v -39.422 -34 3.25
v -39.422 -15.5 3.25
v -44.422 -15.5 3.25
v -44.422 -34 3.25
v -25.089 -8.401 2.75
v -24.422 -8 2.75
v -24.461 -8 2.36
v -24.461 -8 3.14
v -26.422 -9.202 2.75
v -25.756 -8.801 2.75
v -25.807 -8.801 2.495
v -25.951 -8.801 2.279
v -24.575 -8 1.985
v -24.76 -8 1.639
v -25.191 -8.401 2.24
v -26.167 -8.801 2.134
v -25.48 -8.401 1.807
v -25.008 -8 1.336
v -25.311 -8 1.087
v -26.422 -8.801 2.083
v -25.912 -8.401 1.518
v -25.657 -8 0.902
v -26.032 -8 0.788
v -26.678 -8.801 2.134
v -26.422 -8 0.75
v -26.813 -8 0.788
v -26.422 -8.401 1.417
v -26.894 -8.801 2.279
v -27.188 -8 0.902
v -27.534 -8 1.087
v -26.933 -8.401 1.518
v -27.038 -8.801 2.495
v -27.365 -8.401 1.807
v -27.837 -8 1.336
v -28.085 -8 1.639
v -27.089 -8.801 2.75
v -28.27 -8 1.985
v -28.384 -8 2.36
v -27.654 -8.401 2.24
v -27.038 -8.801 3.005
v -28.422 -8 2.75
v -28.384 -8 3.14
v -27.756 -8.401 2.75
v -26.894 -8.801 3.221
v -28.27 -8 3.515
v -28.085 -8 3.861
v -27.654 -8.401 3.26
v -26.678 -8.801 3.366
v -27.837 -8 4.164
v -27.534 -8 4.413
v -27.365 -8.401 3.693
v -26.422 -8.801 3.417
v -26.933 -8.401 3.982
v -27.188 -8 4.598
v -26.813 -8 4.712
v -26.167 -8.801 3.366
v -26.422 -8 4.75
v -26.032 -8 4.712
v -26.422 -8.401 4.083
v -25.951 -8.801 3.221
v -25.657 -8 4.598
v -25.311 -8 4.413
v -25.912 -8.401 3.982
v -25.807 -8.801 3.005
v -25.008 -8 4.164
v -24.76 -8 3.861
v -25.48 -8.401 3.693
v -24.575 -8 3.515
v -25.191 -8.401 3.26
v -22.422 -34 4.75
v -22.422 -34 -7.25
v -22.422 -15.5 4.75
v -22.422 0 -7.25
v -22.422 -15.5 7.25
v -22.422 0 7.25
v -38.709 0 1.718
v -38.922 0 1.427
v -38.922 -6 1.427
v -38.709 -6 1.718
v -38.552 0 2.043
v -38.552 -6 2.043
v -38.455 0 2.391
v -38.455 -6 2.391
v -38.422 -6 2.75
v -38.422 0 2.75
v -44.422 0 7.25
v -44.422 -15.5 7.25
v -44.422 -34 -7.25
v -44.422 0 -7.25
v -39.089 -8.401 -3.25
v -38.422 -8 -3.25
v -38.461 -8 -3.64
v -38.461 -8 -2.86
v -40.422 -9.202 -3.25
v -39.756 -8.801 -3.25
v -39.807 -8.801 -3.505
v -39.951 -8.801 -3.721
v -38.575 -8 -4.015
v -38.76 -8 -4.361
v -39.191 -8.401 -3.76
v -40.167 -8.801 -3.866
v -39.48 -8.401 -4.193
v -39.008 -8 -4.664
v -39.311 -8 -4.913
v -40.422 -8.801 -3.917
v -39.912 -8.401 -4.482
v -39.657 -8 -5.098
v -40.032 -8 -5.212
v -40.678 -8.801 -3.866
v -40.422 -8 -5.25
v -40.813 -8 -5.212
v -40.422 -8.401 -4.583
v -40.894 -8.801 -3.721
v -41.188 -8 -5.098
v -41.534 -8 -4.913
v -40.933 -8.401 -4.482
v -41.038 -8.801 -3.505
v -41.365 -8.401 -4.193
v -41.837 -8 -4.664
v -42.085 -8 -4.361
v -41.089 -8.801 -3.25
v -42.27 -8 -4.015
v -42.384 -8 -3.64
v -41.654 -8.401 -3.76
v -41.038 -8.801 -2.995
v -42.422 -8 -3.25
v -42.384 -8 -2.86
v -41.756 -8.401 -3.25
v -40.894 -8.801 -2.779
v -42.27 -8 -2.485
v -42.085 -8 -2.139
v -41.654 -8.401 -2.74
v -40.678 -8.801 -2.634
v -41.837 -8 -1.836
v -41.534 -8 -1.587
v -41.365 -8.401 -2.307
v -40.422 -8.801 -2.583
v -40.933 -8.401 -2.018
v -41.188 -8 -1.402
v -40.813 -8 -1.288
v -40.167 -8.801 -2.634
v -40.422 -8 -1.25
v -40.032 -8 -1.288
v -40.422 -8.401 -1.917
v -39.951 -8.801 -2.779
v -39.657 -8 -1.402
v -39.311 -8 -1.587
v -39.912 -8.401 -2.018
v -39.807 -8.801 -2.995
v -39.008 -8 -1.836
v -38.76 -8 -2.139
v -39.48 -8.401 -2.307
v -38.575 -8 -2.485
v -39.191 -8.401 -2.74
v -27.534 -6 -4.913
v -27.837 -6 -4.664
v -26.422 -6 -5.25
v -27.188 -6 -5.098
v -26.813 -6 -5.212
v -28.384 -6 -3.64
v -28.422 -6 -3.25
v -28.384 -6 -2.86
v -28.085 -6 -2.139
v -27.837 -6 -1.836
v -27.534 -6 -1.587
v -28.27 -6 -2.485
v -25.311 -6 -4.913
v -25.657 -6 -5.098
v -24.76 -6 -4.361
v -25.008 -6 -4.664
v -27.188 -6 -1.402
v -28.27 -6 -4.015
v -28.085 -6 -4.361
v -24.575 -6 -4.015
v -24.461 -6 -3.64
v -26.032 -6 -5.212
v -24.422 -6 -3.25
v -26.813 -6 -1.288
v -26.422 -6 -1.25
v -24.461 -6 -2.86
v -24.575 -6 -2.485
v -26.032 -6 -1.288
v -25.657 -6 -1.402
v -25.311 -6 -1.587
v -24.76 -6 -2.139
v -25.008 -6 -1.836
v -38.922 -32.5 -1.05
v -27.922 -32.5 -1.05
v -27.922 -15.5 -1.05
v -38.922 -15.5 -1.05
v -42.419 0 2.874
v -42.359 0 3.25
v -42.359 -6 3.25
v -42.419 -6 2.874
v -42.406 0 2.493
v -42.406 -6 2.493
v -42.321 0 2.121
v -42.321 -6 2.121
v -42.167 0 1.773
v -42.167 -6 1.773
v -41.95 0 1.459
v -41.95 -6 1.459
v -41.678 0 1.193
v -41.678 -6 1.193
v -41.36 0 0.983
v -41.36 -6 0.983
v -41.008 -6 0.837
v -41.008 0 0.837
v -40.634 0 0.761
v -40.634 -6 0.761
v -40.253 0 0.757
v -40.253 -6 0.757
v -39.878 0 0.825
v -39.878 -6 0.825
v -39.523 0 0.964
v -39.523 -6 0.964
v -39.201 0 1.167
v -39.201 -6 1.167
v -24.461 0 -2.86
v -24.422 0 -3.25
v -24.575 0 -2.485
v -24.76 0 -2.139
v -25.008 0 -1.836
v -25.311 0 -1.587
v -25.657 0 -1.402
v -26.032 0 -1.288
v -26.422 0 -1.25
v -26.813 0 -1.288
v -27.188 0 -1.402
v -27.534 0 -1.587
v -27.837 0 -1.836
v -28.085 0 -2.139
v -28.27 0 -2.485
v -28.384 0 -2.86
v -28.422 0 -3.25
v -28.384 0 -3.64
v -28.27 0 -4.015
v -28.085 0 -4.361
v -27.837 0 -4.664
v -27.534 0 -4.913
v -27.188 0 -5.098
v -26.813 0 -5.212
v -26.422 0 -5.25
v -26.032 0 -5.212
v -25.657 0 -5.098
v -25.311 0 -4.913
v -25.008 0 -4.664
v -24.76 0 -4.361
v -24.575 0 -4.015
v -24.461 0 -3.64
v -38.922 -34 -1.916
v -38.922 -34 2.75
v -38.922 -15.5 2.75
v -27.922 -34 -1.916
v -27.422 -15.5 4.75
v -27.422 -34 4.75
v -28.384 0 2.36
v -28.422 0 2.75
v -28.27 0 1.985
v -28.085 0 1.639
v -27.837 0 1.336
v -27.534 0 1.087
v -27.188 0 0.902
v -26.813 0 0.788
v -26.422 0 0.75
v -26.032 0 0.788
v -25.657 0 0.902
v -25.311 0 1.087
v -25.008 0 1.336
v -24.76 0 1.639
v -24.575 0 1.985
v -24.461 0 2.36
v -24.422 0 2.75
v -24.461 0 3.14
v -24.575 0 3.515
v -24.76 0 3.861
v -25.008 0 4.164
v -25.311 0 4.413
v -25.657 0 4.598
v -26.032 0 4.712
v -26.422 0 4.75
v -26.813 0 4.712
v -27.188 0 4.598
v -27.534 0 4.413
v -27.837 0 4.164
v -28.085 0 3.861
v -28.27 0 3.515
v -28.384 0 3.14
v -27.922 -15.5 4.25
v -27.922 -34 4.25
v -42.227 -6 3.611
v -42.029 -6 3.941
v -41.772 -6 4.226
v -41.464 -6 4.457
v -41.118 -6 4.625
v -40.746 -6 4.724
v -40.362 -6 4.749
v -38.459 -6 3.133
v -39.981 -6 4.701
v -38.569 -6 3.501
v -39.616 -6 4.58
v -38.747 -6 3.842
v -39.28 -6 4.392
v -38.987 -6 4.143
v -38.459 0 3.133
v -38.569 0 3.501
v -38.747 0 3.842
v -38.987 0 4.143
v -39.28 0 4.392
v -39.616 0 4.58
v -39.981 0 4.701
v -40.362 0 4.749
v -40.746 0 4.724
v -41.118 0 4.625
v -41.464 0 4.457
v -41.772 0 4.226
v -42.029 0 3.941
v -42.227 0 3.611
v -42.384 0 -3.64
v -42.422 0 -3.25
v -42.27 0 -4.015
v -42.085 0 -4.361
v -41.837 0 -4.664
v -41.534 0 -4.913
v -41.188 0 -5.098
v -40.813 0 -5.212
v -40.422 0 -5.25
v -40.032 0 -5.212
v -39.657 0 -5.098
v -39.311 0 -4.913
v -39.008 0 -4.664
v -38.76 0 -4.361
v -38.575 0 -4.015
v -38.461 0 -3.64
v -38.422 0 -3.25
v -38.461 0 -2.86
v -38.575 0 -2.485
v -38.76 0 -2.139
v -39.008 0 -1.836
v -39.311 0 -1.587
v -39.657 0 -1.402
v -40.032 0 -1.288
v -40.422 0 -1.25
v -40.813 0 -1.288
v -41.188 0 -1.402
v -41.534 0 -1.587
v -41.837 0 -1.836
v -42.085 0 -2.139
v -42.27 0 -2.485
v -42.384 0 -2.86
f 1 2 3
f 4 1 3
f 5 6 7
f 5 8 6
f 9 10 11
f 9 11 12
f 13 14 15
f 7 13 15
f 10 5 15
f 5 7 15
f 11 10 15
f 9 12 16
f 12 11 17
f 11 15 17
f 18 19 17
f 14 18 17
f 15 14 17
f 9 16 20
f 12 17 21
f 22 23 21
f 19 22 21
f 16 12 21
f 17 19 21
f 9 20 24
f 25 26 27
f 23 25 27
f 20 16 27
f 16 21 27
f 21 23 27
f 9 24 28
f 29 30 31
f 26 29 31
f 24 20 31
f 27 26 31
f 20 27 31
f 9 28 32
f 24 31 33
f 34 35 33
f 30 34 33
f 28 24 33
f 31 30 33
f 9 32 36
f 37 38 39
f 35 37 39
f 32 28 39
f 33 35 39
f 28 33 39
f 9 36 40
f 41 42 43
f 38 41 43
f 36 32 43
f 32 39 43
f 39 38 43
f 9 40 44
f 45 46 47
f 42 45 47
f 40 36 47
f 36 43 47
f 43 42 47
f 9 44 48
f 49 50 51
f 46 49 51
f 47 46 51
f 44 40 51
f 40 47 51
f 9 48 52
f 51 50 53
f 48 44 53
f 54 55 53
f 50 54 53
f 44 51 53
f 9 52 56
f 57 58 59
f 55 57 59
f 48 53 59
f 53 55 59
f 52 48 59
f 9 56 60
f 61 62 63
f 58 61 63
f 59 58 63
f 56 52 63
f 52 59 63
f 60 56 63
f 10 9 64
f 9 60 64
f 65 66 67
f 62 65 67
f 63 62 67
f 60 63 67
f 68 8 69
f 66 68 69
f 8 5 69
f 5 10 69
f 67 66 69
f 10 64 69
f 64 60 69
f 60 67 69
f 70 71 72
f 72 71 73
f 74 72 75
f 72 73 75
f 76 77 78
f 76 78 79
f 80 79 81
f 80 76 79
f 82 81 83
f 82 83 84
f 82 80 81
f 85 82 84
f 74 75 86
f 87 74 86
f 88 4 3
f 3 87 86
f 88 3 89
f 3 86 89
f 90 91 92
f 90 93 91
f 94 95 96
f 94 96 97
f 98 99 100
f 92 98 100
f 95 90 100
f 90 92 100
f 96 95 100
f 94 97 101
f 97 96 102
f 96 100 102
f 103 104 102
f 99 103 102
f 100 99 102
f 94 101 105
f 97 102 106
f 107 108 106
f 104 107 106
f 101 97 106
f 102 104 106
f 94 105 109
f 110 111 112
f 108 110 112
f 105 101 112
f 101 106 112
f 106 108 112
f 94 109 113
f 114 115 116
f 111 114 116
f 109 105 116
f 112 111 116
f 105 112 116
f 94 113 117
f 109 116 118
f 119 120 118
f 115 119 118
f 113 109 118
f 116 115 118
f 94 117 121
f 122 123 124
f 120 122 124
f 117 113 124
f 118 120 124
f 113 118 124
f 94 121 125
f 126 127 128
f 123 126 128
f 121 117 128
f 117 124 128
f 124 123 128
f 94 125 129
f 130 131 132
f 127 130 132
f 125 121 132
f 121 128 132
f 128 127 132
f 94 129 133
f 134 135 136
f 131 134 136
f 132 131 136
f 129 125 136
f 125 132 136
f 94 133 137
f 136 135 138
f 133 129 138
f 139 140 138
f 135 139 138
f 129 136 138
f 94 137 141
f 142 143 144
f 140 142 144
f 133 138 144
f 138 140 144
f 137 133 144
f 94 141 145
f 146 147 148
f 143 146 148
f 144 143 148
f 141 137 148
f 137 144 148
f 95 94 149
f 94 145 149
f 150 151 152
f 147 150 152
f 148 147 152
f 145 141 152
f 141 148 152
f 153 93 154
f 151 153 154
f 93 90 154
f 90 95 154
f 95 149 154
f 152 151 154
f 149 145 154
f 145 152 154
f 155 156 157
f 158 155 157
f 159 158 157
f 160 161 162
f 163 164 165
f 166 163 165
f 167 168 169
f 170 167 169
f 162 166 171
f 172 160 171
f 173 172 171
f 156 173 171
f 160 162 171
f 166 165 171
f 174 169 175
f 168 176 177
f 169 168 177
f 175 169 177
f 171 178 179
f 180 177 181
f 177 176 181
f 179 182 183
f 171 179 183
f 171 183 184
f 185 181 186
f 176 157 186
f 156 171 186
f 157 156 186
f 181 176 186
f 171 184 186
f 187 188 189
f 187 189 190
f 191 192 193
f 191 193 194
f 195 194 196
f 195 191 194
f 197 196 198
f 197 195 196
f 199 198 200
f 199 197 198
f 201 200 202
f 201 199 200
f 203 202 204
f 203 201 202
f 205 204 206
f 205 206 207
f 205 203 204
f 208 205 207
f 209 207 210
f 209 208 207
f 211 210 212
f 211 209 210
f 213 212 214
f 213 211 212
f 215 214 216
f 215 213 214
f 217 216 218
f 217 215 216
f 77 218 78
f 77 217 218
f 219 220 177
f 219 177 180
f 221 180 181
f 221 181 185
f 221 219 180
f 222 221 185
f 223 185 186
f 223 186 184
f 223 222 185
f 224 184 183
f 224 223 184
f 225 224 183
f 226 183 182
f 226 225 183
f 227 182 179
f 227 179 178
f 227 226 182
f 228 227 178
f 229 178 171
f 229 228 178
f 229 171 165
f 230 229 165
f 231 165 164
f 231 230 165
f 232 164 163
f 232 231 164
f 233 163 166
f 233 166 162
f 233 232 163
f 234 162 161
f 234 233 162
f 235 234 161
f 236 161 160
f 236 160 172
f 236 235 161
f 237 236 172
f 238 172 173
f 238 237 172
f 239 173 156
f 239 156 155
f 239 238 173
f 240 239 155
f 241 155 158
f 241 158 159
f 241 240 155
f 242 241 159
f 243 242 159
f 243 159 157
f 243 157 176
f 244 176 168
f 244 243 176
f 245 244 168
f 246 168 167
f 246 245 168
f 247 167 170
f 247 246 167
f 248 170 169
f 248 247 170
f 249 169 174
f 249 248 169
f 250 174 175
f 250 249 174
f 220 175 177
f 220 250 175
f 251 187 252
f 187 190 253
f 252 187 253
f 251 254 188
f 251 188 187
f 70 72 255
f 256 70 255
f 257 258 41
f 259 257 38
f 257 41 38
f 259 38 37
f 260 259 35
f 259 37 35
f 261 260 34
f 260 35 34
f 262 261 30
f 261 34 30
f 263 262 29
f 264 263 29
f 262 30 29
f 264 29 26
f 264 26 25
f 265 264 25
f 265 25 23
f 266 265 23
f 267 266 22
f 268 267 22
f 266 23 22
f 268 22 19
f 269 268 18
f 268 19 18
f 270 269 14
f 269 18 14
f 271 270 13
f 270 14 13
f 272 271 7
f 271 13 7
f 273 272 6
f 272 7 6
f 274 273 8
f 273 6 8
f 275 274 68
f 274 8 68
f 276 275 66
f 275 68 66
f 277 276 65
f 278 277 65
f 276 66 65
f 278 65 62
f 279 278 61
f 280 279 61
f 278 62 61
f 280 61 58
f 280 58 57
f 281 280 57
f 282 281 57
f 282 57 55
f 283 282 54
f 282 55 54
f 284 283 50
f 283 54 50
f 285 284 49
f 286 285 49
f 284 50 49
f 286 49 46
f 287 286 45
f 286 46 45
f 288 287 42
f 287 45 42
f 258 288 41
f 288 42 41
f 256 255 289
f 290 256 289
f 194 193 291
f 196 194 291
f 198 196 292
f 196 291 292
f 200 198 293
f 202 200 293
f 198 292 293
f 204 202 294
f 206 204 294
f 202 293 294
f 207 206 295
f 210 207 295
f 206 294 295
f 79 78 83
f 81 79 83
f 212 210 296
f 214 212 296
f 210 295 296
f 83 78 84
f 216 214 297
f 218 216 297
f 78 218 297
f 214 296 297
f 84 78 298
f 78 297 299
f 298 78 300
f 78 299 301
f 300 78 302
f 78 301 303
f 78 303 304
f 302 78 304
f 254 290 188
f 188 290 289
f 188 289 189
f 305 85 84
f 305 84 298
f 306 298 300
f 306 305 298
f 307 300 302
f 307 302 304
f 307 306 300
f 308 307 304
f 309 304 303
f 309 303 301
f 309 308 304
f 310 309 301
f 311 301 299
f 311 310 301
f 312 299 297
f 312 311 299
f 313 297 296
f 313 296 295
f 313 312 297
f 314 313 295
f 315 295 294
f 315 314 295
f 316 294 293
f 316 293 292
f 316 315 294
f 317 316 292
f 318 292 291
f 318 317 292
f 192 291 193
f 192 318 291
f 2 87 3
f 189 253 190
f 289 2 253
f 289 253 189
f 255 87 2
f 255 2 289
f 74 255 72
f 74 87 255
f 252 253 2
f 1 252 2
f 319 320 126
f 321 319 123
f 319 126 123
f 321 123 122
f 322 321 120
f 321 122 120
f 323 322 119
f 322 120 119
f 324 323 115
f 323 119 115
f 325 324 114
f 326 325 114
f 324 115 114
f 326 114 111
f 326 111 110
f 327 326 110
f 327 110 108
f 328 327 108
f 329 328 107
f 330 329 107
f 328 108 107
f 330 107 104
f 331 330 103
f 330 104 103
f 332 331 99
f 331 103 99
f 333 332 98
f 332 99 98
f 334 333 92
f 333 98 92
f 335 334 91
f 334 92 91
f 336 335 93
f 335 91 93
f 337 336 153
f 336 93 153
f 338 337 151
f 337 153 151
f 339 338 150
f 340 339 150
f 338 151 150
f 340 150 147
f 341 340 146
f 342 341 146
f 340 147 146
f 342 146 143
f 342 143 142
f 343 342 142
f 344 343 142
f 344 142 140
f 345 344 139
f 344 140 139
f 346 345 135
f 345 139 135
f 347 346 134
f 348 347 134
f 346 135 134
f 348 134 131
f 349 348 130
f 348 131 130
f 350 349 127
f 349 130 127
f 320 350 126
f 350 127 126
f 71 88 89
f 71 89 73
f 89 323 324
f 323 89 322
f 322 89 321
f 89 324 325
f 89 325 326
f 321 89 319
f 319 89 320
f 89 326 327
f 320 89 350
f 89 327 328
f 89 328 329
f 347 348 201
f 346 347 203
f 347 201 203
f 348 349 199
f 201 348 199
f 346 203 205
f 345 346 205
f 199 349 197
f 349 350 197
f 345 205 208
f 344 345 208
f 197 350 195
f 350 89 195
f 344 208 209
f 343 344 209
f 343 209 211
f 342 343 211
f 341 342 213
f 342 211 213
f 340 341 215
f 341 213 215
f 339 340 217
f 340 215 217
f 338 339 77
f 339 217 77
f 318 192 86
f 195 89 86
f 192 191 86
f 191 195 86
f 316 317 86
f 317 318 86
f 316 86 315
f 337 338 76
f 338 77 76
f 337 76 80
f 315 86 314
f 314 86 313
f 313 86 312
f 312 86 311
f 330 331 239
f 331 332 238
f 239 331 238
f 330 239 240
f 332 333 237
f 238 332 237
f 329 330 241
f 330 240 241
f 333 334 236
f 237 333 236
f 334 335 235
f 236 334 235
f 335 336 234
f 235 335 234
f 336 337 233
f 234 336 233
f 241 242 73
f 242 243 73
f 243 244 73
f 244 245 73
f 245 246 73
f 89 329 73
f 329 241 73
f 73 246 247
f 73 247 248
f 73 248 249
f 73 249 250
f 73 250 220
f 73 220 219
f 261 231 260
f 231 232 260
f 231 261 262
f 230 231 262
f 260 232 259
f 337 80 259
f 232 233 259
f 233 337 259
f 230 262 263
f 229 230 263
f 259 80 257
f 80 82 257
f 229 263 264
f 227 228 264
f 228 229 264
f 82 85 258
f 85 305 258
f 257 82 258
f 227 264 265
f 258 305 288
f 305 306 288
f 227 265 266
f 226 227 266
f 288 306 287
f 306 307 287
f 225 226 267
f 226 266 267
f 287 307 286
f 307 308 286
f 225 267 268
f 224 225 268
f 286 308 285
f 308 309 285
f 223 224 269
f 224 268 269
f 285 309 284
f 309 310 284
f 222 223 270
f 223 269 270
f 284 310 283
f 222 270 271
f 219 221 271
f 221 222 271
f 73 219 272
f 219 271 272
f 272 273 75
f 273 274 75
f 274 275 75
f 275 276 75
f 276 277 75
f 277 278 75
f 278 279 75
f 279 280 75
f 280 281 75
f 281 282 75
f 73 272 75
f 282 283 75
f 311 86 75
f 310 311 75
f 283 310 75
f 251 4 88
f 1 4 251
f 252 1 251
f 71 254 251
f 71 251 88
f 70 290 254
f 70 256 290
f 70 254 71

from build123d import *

# Parameters (mm, degrees)
F0_W     = 11
F0_H     = 1.5
F0_R     = 1.62
F0_R_2   = 2
F1_DEPTH = 15.5
F3_DEPTH = 18.5
F4_D     = 4
F4_DEPTH = 8
F4_TIP   = 1.2017212381
F5_DEPTH = 6
F6_SIZE2 = 0.8660254038
F6_SIZE  = 1.5


with BuildPart() as f1:
    # F0 (on Front) → F1 (new body)
    with BuildSketch(Plane.XZ):
        with Locations((-33.422443, -0.3)):
            Rectangle(F0_W, F0_H)
        with BuildLine():
            ThreePointArc((-42.3589346731, 3.25), (-41.3596463712, 0.9831808692), (-38.922443, 1.4271243445))
            Line((-38.922443, 1.4271243445), (-38.922443, 2.75))
            Line((-38.922443, 2.75), (-39.422443, 3.25))
            Line((-39.422443, 3.25), (-42.3589346731, 3.25))
        make_face()
        with BuildLine():
            Line((-38.922443, 1.4271243445), (-38.922443, 0.45))
            Line((-38.922443, 0.45), (-27.922443, 0.45))
            Line((-27.922443, 0.45), (-27.922443, 1.4271243445))
            Line((-27.922443, 1.4271243445), (-27.922443, 2.1381176584))
            ThreePointArc((-27.922443, 2.1381176584), (-28.042443, 2.75), (-27.922443, 3.3618823416))
            Line((-27.922443, 3.3618823416), (-27.922443, 4.25))
            Line((-27.922443, 4.25), (-27.422443, 4.75))
            Line((-27.422443, 4.75), (-26.4224430007, 4.75))
            Line((-26.4224430007, 4.75), (-22.422443, 4.75))
            Line((-22.422443, 4.75), (-22.422443, 7.25))
            Line((-22.422443, 7.25), (-44.422443, 7.25))
            Line((-44.422443, 7.25), (-44.422443, 3.25))
            Line((-44.422443, 3.25), (-42.3589346731, 3.25))
            ThreePointArc((-42.3589346731, 3.25), (-40.170434415, 4.7340593925), (-38.422443, 2.75))
            ThreePointArc((-38.422443, 2.75), (-38.5516143066, 2.0428932188), (-38.922443, 1.4271243445))
        make_face()
        with BuildLine():
            Line((-38.922443, 2.75), (-38.922443, 1.4271243445))
            ThreePointArc((-38.922443, 1.4271243445), (-38.5516143066, 2.0428932188), (-38.422443, 2.75))
            ThreePointArc((-38.422443, 2.75), (-40.170434415, 4.7340593925), (-42.3589346731, 3.25))
            Line((-42.3589346731, 3.25), (-39.422443, 3.25))
            Line((-39.422443, 3.25), (-38.922443, 2.75))
        make_face()
        with BuildLine():
            Line((-27.922443, 3.3618823416), (-27.922443, 2.1381176584))
            ThreePointArc((-27.922443, 2.1381176584), (-26.1106738546, 1.1602830441), (-24.802443, 2.75))
            ThreePointArc((-24.802443, 2.75), (-26.1106738546, 4.3397169559), (-27.922443, 3.3618823416))
        make_face()
        with BuildLine():
            Line((-27.922443, -1.05), (-38.922443, -1.05))
            Line((-38.922443, -1.05), (-38.922443, 0.45))
            Line((-38.922443, 0.45), (-38.922443, 1.4271243445))
            ThreePointArc((-38.922443, 1.4271243445), (-41.3596463712, 0.9831808692), (-42.3589346731, 3.25))
            Line((-42.3589346731, 3.25), (-44.422443, 3.25))
            Line((-44.422443, 3.25), (-44.422443, -7.25))
            Line((-44.422443, -7.25), (-22.422443, -7.25))
            Line((-22.422443, -7.25), (-22.422443, 4.75))
            Line((-22.422443, 4.75), (-26.4224430007, 4.75))
            ThreePointArc((-26.4224430007, 4.75), (-24.5995673443, 1.9271243448), (-27.922443, 1.4271243445))
            Line((-27.922443, 1.4271243445), (-27.922443, 0.45))
            Line((-27.922443, 0.45), (-27.922443, -1.05))
        make_face()
        with Locations((-40.422443, -3.25)):
            Circle(F0_R, mode=Mode.SUBTRACT)
        with Locations((-26.422443, -3.25)):
            Circle(F0_R_2, mode=Mode.SUBTRACT)
        with Locations((-26.422443, -3.25)):
            Circle(F0_R_2)
        with Locations((-40.422443, -3.25)):
            Circle(F0_R)
        with BuildLine():
            Line((-27.922443, 2.1381176584), (-27.922443, 1.4271243445))
            ThreePointArc((-27.922443, 1.4271243445), (-24.5995673443, 1.9271243448), (-26.4224430007, 4.75))
            Line((-26.4224430007, 4.75), (-27.422443, 4.75))
            Line((-27.422443, 4.75), (-27.922443, 4.25))
            Line((-27.922443, 4.25), (-27.922443, 3.3618823416))
            ThreePointArc((-27.922443, 3.3618823416), (-26.1106738546, 4.3397169559), (-24.802443, 2.75))
            ThreePointArc((-24.802443, 2.75), (-26.1106738546, 1.1602830441), (-27.922443, 2.1381176584))
        make_face()
        with BuildLine():
            ThreePointArc((-27.922443, 3.3618823416), (-28.042443, 2.75), (-27.922443, 2.1381176584))
            Line((-27.922443, 2.1381176584), (-27.922443, 3.3618823416))
        make_face()
    extrude(amount=F1_DEPTH)

    # F2 (on face) → F3 (join)
    with BuildSketch(Plane.XZ.offset(15.5)):
        Polygon((-27.922443, -1.05), (-38.922443, -1.05), (-38.922443, 2.75), (-39.422443, 3.25), (-44.422443, 3.25), (-44.422443, -7.25), (-22.422443, -7.25), (-22.422443, 4.75), (-27.422443, 4.75), (-27.922443, 4.25), align=None)
    extrude(amount=F3_DEPTH)

    # F4
    with Locations(Plane(origin=(0, 0, 0), x_dir=(1, 0, 0), z_dir=(0, 1, 0))):
        with Locations((-40.422443, 3.25), (-26.422443, -2.75)):
            Hole(F4_D / 2, depth=F4_DEPTH)
            with Locations((0, 0, -(F4_DEPTH + F4_TIP / 2))):  # 118° drill point
                Cone(0, F4_D / 2, F4_TIP, mode=Mode.SUBTRACT)

    # F0 (on Front) → F5 (cut)
    with BuildSketch(Plane.XZ):
        with BuildLine():
            Line((-38.922443, 2.75), (-38.922443, 1.4271243445))
            ThreePointArc((-38.922443, 1.4271243445), (-38.5516143066, 2.0428932188), (-38.422443, 2.75))
            ThreePointArc((-38.422443, 2.75), (-40.170434415, 4.7340593925), (-42.3589346731, 3.25))
            Line((-42.3589346731, 3.25), (-39.422443, 3.25))
            Line((-39.422443, 3.25), (-38.922443, 2.75))
        make_face()
        with BuildLine():
            ThreePointArc((-42.3589346731, 3.25), (-41.3596463712, 0.9831808692), (-38.922443, 1.4271243445))
            Line((-38.922443, 1.4271243445), (-38.922443, 2.75))
            Line((-38.922443, 2.75), (-39.422443, 3.25))
            Line((-39.422443, 3.25), (-42.3589346731, 3.25))
        make_face()
        with Locations((-26.422443, -3.25)):
            Circle(F0_R_2)
    extrude(amount=F5_DEPTH, mode=Mode.SUBTRACT)

    # F6
    f6_edges = [f1.edges().sort_by_distance(p)[0] for p in [
        (-33.422443, -34, -1.05),
    ]]
    f6_side = f1.faces().sort_by_distance((-33.422443, -24.75, -1.05))[0]
    chamfer(f6_edges, length=F6_SIZE, length2=F6_SIZE2, reference=f6_side)


solid = f1.part
